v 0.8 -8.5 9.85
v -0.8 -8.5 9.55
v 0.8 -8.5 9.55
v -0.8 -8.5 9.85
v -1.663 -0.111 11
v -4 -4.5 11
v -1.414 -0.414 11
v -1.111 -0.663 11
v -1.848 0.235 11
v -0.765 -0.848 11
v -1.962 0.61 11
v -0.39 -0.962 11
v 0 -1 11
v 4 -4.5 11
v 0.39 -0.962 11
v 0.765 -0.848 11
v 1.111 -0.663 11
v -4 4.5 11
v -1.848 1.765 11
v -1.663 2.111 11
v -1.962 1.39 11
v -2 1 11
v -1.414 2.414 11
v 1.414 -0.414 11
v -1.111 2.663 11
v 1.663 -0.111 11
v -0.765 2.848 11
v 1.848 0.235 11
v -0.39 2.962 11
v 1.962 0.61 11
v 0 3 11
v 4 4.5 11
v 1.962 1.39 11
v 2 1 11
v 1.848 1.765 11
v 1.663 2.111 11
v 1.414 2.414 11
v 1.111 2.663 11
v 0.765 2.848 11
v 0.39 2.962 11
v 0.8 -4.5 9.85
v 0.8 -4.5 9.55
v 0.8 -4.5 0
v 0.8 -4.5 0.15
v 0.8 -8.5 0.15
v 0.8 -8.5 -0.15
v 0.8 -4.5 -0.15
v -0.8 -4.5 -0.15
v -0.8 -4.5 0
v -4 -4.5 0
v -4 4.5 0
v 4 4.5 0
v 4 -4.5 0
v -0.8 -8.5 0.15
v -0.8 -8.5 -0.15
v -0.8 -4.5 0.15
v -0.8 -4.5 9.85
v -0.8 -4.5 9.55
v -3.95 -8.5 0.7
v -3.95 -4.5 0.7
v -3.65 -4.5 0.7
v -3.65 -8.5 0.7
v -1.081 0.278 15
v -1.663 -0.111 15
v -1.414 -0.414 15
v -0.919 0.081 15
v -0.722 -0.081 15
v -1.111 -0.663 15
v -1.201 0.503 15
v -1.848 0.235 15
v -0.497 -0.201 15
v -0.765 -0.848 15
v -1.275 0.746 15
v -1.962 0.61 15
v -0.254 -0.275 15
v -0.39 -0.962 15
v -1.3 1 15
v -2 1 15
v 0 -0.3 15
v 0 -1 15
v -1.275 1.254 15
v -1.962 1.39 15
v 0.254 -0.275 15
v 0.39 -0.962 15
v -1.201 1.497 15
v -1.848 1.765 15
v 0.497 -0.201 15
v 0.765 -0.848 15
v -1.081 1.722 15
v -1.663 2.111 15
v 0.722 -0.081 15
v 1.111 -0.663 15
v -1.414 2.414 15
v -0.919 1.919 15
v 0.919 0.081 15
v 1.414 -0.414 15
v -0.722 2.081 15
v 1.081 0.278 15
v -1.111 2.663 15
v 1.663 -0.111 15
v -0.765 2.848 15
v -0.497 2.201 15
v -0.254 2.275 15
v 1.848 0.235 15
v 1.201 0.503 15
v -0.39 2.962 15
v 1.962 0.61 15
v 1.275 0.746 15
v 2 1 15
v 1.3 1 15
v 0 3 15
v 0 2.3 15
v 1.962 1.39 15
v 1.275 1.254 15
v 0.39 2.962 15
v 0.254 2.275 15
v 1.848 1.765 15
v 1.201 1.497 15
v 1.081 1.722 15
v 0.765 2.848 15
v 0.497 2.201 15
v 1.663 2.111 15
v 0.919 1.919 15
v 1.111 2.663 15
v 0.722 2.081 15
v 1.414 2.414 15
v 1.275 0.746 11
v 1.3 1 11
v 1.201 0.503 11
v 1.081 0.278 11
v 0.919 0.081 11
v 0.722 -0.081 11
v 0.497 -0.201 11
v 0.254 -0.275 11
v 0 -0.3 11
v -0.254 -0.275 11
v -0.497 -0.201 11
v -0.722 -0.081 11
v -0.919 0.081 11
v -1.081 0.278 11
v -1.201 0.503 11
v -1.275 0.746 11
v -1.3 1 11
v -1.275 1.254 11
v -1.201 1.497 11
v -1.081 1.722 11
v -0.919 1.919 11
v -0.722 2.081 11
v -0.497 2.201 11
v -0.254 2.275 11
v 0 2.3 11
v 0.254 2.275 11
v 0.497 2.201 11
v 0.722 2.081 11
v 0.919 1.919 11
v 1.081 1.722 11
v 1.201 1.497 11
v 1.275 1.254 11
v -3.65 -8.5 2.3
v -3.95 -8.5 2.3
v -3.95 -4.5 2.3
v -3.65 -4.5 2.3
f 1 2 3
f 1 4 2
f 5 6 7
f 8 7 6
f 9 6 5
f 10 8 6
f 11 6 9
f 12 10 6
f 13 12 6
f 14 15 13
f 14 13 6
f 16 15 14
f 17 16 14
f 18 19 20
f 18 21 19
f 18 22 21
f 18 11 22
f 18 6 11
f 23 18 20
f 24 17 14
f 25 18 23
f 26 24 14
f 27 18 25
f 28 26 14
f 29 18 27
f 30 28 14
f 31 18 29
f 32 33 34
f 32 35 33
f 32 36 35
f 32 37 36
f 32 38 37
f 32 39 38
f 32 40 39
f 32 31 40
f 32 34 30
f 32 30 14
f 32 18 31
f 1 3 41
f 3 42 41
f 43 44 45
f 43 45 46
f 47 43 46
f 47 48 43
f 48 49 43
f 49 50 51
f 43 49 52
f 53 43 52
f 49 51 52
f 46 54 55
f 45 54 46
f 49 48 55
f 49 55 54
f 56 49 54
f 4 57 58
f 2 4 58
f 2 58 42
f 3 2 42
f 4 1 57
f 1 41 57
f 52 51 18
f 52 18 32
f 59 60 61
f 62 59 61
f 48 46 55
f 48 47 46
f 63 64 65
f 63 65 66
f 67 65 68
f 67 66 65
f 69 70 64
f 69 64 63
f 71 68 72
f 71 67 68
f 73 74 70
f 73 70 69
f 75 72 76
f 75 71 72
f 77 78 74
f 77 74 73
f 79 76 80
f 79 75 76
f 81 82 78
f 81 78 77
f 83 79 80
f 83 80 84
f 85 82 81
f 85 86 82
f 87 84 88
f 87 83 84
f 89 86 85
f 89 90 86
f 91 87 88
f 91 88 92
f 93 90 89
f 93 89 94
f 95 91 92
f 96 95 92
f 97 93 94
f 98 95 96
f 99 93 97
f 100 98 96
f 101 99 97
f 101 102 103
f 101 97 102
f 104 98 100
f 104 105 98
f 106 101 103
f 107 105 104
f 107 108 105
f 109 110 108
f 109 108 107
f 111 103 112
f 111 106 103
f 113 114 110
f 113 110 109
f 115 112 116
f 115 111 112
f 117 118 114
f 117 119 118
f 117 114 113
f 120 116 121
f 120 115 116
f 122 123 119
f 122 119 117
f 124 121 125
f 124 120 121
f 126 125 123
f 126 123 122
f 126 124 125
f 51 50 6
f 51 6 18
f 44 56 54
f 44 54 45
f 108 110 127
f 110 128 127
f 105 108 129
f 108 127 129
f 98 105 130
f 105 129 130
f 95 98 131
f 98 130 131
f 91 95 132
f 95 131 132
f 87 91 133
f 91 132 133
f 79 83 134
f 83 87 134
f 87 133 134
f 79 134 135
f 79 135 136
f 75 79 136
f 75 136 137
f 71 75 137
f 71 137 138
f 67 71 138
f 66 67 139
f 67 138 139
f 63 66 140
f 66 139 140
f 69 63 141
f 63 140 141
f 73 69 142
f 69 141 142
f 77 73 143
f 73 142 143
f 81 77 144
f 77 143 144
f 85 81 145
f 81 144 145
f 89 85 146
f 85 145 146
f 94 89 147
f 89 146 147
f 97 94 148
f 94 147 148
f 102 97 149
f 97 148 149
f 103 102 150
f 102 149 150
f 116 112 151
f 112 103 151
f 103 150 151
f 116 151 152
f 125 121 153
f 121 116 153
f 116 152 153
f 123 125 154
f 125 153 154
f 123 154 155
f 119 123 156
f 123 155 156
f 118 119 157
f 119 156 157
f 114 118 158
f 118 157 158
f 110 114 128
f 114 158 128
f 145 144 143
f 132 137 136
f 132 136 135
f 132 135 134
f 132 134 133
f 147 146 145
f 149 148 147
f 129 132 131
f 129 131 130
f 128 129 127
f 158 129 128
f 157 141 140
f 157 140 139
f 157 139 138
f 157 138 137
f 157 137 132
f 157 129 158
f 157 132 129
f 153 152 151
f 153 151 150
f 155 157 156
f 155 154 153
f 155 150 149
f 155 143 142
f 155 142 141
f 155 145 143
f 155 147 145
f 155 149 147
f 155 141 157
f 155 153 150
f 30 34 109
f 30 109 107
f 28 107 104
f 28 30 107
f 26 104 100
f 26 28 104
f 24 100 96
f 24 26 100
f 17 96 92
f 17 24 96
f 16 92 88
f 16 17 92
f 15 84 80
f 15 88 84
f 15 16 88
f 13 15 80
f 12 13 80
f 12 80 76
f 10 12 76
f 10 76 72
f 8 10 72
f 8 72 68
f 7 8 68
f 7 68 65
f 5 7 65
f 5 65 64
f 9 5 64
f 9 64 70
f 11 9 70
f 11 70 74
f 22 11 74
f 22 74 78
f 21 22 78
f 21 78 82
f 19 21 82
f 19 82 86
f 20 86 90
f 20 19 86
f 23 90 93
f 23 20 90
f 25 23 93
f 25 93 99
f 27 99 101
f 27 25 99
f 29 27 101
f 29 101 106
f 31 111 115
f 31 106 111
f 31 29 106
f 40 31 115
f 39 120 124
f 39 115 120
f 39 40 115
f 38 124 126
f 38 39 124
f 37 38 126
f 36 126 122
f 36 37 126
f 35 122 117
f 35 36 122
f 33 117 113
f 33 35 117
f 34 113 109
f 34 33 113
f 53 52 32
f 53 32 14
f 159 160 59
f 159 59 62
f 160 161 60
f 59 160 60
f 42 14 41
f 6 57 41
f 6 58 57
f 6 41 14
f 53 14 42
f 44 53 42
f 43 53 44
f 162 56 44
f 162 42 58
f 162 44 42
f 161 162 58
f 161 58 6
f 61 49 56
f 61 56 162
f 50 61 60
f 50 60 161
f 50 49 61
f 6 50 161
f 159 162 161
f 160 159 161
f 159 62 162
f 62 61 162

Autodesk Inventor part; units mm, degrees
ref_plane "YZ Plane" through (0, 0, 0) normal (1, 0, 0) x (0, 1, 0)
ref_plane "XZ Plane" through (0, 0, 0) normal (0, 1, 0) x (-1, 0, 0)
ref_plane "XY Plane" through (0, 0, 0) normal (0, 0, 1) x (1, 0, 0)
sketch "スケッチ1" plane through (0, 0, 0) normal (0, 0, 1) x (1, 0, 0)
  line L0 (-4, 4.5) -> (4, 4.5)
  line L1 (4, 4.5) -> (4, -4.5)
  line L2 (4, -4.5) -> (-4, -4.5)
  line L3 (-4, -4.5) -> (-4, 4.5)
  line L4 (-4, 4.5) -> (4, -4.5) construction
  line L5 (4, 4.5) -> (-4, -4.5) construction
  point P0 (0, 0)
  dimension "d0" = 8
  dimension "d1" = 9
extrude "押し出し1" add sketch "スケッチ1" along normal blind 11
sketch "スケッチ2" plane through (0, 0, 11) normal (0, 0, 1) x (1, 0, 0)
  circle A0 centre (0, 1) radius 2
  circle A1 centre (0, 1) radius 1.3
  line L0 (-4, -4.5) -> (4, -4.5) projected
  point P0 (0, 0)
  dimension "d4" = 4
  dimension "d5" = 2.6
  dimension "d6" = 5.5
extrude "押し出し2" add sketch "スケッチ2" along normal blind 4
sketch "スケッチ3" plane through (-4, -4.5, 0) normal (0, -1, 0) x (1, 0, 0)
  line L0 (4.8, 9.85) -> (3.2, 9.85)
  line L1 (3.2, 9.85) -> (3.2, 9.55)
  line L2 (3.2, 9.55) -> (4.8, 9.55)
  line L3 (4.8, 9.55) -> (4.8, 9.85)
  line L4 (4.8, 9.85) -> (3.2, 9.55) construction
  line L5 (3.2, 9.85) -> (4.8, 9.55) construction
  line L6 (4.8, -0.15) -> (3.2, -0.15)
  line L7 (3.2, -0.15) -> (3.2, 0.15)
  line L8 (3.2, 0.15) -> (4.8, 0.15)
  line L9 (4.8, 0.15) -> (4.8, -0.15)
  line L10 (4.8, -0.15) -> (3.2, 0.15) construction
  line L11 (3.2, -0.15) -> (4.8, 0.15) construction
  line L12 (0, 11) -> (8, 11) projected
  line L13 (0.35, 2.3) -> (0.05, 2.3)
  line L14 (0.05, 2.3) -> (0.05, 0.7)
  line L15 (0.05, 0.7) -> (0.35, 0.7)
  line L16 (0.35, 0.7) -> (0.35, 2.3)
  line L17 (0.35, 2.3) -> (0.05, 0.7) construction
  line L18 (0.05, 2.3) -> (0.35, 0.7) construction
  point P0 (4, 0)
  point P1 (4, 9.7)
  point P2 (4, 9.7)
  point P3 (4, 0)
  point P4 (0.2, 1.5)
  dimension "d9" = 1.3
  dimension "d10" = 0.3
  dimension "d11" = 1.6
  dimension "d12" = 9.5
  dimension "d13" = 3.8
extrude "押し出し3" add sketch "スケッチ3" along normal blind 4
properties part number "Circuit_PhoneJack_HLA-2503D1l"
